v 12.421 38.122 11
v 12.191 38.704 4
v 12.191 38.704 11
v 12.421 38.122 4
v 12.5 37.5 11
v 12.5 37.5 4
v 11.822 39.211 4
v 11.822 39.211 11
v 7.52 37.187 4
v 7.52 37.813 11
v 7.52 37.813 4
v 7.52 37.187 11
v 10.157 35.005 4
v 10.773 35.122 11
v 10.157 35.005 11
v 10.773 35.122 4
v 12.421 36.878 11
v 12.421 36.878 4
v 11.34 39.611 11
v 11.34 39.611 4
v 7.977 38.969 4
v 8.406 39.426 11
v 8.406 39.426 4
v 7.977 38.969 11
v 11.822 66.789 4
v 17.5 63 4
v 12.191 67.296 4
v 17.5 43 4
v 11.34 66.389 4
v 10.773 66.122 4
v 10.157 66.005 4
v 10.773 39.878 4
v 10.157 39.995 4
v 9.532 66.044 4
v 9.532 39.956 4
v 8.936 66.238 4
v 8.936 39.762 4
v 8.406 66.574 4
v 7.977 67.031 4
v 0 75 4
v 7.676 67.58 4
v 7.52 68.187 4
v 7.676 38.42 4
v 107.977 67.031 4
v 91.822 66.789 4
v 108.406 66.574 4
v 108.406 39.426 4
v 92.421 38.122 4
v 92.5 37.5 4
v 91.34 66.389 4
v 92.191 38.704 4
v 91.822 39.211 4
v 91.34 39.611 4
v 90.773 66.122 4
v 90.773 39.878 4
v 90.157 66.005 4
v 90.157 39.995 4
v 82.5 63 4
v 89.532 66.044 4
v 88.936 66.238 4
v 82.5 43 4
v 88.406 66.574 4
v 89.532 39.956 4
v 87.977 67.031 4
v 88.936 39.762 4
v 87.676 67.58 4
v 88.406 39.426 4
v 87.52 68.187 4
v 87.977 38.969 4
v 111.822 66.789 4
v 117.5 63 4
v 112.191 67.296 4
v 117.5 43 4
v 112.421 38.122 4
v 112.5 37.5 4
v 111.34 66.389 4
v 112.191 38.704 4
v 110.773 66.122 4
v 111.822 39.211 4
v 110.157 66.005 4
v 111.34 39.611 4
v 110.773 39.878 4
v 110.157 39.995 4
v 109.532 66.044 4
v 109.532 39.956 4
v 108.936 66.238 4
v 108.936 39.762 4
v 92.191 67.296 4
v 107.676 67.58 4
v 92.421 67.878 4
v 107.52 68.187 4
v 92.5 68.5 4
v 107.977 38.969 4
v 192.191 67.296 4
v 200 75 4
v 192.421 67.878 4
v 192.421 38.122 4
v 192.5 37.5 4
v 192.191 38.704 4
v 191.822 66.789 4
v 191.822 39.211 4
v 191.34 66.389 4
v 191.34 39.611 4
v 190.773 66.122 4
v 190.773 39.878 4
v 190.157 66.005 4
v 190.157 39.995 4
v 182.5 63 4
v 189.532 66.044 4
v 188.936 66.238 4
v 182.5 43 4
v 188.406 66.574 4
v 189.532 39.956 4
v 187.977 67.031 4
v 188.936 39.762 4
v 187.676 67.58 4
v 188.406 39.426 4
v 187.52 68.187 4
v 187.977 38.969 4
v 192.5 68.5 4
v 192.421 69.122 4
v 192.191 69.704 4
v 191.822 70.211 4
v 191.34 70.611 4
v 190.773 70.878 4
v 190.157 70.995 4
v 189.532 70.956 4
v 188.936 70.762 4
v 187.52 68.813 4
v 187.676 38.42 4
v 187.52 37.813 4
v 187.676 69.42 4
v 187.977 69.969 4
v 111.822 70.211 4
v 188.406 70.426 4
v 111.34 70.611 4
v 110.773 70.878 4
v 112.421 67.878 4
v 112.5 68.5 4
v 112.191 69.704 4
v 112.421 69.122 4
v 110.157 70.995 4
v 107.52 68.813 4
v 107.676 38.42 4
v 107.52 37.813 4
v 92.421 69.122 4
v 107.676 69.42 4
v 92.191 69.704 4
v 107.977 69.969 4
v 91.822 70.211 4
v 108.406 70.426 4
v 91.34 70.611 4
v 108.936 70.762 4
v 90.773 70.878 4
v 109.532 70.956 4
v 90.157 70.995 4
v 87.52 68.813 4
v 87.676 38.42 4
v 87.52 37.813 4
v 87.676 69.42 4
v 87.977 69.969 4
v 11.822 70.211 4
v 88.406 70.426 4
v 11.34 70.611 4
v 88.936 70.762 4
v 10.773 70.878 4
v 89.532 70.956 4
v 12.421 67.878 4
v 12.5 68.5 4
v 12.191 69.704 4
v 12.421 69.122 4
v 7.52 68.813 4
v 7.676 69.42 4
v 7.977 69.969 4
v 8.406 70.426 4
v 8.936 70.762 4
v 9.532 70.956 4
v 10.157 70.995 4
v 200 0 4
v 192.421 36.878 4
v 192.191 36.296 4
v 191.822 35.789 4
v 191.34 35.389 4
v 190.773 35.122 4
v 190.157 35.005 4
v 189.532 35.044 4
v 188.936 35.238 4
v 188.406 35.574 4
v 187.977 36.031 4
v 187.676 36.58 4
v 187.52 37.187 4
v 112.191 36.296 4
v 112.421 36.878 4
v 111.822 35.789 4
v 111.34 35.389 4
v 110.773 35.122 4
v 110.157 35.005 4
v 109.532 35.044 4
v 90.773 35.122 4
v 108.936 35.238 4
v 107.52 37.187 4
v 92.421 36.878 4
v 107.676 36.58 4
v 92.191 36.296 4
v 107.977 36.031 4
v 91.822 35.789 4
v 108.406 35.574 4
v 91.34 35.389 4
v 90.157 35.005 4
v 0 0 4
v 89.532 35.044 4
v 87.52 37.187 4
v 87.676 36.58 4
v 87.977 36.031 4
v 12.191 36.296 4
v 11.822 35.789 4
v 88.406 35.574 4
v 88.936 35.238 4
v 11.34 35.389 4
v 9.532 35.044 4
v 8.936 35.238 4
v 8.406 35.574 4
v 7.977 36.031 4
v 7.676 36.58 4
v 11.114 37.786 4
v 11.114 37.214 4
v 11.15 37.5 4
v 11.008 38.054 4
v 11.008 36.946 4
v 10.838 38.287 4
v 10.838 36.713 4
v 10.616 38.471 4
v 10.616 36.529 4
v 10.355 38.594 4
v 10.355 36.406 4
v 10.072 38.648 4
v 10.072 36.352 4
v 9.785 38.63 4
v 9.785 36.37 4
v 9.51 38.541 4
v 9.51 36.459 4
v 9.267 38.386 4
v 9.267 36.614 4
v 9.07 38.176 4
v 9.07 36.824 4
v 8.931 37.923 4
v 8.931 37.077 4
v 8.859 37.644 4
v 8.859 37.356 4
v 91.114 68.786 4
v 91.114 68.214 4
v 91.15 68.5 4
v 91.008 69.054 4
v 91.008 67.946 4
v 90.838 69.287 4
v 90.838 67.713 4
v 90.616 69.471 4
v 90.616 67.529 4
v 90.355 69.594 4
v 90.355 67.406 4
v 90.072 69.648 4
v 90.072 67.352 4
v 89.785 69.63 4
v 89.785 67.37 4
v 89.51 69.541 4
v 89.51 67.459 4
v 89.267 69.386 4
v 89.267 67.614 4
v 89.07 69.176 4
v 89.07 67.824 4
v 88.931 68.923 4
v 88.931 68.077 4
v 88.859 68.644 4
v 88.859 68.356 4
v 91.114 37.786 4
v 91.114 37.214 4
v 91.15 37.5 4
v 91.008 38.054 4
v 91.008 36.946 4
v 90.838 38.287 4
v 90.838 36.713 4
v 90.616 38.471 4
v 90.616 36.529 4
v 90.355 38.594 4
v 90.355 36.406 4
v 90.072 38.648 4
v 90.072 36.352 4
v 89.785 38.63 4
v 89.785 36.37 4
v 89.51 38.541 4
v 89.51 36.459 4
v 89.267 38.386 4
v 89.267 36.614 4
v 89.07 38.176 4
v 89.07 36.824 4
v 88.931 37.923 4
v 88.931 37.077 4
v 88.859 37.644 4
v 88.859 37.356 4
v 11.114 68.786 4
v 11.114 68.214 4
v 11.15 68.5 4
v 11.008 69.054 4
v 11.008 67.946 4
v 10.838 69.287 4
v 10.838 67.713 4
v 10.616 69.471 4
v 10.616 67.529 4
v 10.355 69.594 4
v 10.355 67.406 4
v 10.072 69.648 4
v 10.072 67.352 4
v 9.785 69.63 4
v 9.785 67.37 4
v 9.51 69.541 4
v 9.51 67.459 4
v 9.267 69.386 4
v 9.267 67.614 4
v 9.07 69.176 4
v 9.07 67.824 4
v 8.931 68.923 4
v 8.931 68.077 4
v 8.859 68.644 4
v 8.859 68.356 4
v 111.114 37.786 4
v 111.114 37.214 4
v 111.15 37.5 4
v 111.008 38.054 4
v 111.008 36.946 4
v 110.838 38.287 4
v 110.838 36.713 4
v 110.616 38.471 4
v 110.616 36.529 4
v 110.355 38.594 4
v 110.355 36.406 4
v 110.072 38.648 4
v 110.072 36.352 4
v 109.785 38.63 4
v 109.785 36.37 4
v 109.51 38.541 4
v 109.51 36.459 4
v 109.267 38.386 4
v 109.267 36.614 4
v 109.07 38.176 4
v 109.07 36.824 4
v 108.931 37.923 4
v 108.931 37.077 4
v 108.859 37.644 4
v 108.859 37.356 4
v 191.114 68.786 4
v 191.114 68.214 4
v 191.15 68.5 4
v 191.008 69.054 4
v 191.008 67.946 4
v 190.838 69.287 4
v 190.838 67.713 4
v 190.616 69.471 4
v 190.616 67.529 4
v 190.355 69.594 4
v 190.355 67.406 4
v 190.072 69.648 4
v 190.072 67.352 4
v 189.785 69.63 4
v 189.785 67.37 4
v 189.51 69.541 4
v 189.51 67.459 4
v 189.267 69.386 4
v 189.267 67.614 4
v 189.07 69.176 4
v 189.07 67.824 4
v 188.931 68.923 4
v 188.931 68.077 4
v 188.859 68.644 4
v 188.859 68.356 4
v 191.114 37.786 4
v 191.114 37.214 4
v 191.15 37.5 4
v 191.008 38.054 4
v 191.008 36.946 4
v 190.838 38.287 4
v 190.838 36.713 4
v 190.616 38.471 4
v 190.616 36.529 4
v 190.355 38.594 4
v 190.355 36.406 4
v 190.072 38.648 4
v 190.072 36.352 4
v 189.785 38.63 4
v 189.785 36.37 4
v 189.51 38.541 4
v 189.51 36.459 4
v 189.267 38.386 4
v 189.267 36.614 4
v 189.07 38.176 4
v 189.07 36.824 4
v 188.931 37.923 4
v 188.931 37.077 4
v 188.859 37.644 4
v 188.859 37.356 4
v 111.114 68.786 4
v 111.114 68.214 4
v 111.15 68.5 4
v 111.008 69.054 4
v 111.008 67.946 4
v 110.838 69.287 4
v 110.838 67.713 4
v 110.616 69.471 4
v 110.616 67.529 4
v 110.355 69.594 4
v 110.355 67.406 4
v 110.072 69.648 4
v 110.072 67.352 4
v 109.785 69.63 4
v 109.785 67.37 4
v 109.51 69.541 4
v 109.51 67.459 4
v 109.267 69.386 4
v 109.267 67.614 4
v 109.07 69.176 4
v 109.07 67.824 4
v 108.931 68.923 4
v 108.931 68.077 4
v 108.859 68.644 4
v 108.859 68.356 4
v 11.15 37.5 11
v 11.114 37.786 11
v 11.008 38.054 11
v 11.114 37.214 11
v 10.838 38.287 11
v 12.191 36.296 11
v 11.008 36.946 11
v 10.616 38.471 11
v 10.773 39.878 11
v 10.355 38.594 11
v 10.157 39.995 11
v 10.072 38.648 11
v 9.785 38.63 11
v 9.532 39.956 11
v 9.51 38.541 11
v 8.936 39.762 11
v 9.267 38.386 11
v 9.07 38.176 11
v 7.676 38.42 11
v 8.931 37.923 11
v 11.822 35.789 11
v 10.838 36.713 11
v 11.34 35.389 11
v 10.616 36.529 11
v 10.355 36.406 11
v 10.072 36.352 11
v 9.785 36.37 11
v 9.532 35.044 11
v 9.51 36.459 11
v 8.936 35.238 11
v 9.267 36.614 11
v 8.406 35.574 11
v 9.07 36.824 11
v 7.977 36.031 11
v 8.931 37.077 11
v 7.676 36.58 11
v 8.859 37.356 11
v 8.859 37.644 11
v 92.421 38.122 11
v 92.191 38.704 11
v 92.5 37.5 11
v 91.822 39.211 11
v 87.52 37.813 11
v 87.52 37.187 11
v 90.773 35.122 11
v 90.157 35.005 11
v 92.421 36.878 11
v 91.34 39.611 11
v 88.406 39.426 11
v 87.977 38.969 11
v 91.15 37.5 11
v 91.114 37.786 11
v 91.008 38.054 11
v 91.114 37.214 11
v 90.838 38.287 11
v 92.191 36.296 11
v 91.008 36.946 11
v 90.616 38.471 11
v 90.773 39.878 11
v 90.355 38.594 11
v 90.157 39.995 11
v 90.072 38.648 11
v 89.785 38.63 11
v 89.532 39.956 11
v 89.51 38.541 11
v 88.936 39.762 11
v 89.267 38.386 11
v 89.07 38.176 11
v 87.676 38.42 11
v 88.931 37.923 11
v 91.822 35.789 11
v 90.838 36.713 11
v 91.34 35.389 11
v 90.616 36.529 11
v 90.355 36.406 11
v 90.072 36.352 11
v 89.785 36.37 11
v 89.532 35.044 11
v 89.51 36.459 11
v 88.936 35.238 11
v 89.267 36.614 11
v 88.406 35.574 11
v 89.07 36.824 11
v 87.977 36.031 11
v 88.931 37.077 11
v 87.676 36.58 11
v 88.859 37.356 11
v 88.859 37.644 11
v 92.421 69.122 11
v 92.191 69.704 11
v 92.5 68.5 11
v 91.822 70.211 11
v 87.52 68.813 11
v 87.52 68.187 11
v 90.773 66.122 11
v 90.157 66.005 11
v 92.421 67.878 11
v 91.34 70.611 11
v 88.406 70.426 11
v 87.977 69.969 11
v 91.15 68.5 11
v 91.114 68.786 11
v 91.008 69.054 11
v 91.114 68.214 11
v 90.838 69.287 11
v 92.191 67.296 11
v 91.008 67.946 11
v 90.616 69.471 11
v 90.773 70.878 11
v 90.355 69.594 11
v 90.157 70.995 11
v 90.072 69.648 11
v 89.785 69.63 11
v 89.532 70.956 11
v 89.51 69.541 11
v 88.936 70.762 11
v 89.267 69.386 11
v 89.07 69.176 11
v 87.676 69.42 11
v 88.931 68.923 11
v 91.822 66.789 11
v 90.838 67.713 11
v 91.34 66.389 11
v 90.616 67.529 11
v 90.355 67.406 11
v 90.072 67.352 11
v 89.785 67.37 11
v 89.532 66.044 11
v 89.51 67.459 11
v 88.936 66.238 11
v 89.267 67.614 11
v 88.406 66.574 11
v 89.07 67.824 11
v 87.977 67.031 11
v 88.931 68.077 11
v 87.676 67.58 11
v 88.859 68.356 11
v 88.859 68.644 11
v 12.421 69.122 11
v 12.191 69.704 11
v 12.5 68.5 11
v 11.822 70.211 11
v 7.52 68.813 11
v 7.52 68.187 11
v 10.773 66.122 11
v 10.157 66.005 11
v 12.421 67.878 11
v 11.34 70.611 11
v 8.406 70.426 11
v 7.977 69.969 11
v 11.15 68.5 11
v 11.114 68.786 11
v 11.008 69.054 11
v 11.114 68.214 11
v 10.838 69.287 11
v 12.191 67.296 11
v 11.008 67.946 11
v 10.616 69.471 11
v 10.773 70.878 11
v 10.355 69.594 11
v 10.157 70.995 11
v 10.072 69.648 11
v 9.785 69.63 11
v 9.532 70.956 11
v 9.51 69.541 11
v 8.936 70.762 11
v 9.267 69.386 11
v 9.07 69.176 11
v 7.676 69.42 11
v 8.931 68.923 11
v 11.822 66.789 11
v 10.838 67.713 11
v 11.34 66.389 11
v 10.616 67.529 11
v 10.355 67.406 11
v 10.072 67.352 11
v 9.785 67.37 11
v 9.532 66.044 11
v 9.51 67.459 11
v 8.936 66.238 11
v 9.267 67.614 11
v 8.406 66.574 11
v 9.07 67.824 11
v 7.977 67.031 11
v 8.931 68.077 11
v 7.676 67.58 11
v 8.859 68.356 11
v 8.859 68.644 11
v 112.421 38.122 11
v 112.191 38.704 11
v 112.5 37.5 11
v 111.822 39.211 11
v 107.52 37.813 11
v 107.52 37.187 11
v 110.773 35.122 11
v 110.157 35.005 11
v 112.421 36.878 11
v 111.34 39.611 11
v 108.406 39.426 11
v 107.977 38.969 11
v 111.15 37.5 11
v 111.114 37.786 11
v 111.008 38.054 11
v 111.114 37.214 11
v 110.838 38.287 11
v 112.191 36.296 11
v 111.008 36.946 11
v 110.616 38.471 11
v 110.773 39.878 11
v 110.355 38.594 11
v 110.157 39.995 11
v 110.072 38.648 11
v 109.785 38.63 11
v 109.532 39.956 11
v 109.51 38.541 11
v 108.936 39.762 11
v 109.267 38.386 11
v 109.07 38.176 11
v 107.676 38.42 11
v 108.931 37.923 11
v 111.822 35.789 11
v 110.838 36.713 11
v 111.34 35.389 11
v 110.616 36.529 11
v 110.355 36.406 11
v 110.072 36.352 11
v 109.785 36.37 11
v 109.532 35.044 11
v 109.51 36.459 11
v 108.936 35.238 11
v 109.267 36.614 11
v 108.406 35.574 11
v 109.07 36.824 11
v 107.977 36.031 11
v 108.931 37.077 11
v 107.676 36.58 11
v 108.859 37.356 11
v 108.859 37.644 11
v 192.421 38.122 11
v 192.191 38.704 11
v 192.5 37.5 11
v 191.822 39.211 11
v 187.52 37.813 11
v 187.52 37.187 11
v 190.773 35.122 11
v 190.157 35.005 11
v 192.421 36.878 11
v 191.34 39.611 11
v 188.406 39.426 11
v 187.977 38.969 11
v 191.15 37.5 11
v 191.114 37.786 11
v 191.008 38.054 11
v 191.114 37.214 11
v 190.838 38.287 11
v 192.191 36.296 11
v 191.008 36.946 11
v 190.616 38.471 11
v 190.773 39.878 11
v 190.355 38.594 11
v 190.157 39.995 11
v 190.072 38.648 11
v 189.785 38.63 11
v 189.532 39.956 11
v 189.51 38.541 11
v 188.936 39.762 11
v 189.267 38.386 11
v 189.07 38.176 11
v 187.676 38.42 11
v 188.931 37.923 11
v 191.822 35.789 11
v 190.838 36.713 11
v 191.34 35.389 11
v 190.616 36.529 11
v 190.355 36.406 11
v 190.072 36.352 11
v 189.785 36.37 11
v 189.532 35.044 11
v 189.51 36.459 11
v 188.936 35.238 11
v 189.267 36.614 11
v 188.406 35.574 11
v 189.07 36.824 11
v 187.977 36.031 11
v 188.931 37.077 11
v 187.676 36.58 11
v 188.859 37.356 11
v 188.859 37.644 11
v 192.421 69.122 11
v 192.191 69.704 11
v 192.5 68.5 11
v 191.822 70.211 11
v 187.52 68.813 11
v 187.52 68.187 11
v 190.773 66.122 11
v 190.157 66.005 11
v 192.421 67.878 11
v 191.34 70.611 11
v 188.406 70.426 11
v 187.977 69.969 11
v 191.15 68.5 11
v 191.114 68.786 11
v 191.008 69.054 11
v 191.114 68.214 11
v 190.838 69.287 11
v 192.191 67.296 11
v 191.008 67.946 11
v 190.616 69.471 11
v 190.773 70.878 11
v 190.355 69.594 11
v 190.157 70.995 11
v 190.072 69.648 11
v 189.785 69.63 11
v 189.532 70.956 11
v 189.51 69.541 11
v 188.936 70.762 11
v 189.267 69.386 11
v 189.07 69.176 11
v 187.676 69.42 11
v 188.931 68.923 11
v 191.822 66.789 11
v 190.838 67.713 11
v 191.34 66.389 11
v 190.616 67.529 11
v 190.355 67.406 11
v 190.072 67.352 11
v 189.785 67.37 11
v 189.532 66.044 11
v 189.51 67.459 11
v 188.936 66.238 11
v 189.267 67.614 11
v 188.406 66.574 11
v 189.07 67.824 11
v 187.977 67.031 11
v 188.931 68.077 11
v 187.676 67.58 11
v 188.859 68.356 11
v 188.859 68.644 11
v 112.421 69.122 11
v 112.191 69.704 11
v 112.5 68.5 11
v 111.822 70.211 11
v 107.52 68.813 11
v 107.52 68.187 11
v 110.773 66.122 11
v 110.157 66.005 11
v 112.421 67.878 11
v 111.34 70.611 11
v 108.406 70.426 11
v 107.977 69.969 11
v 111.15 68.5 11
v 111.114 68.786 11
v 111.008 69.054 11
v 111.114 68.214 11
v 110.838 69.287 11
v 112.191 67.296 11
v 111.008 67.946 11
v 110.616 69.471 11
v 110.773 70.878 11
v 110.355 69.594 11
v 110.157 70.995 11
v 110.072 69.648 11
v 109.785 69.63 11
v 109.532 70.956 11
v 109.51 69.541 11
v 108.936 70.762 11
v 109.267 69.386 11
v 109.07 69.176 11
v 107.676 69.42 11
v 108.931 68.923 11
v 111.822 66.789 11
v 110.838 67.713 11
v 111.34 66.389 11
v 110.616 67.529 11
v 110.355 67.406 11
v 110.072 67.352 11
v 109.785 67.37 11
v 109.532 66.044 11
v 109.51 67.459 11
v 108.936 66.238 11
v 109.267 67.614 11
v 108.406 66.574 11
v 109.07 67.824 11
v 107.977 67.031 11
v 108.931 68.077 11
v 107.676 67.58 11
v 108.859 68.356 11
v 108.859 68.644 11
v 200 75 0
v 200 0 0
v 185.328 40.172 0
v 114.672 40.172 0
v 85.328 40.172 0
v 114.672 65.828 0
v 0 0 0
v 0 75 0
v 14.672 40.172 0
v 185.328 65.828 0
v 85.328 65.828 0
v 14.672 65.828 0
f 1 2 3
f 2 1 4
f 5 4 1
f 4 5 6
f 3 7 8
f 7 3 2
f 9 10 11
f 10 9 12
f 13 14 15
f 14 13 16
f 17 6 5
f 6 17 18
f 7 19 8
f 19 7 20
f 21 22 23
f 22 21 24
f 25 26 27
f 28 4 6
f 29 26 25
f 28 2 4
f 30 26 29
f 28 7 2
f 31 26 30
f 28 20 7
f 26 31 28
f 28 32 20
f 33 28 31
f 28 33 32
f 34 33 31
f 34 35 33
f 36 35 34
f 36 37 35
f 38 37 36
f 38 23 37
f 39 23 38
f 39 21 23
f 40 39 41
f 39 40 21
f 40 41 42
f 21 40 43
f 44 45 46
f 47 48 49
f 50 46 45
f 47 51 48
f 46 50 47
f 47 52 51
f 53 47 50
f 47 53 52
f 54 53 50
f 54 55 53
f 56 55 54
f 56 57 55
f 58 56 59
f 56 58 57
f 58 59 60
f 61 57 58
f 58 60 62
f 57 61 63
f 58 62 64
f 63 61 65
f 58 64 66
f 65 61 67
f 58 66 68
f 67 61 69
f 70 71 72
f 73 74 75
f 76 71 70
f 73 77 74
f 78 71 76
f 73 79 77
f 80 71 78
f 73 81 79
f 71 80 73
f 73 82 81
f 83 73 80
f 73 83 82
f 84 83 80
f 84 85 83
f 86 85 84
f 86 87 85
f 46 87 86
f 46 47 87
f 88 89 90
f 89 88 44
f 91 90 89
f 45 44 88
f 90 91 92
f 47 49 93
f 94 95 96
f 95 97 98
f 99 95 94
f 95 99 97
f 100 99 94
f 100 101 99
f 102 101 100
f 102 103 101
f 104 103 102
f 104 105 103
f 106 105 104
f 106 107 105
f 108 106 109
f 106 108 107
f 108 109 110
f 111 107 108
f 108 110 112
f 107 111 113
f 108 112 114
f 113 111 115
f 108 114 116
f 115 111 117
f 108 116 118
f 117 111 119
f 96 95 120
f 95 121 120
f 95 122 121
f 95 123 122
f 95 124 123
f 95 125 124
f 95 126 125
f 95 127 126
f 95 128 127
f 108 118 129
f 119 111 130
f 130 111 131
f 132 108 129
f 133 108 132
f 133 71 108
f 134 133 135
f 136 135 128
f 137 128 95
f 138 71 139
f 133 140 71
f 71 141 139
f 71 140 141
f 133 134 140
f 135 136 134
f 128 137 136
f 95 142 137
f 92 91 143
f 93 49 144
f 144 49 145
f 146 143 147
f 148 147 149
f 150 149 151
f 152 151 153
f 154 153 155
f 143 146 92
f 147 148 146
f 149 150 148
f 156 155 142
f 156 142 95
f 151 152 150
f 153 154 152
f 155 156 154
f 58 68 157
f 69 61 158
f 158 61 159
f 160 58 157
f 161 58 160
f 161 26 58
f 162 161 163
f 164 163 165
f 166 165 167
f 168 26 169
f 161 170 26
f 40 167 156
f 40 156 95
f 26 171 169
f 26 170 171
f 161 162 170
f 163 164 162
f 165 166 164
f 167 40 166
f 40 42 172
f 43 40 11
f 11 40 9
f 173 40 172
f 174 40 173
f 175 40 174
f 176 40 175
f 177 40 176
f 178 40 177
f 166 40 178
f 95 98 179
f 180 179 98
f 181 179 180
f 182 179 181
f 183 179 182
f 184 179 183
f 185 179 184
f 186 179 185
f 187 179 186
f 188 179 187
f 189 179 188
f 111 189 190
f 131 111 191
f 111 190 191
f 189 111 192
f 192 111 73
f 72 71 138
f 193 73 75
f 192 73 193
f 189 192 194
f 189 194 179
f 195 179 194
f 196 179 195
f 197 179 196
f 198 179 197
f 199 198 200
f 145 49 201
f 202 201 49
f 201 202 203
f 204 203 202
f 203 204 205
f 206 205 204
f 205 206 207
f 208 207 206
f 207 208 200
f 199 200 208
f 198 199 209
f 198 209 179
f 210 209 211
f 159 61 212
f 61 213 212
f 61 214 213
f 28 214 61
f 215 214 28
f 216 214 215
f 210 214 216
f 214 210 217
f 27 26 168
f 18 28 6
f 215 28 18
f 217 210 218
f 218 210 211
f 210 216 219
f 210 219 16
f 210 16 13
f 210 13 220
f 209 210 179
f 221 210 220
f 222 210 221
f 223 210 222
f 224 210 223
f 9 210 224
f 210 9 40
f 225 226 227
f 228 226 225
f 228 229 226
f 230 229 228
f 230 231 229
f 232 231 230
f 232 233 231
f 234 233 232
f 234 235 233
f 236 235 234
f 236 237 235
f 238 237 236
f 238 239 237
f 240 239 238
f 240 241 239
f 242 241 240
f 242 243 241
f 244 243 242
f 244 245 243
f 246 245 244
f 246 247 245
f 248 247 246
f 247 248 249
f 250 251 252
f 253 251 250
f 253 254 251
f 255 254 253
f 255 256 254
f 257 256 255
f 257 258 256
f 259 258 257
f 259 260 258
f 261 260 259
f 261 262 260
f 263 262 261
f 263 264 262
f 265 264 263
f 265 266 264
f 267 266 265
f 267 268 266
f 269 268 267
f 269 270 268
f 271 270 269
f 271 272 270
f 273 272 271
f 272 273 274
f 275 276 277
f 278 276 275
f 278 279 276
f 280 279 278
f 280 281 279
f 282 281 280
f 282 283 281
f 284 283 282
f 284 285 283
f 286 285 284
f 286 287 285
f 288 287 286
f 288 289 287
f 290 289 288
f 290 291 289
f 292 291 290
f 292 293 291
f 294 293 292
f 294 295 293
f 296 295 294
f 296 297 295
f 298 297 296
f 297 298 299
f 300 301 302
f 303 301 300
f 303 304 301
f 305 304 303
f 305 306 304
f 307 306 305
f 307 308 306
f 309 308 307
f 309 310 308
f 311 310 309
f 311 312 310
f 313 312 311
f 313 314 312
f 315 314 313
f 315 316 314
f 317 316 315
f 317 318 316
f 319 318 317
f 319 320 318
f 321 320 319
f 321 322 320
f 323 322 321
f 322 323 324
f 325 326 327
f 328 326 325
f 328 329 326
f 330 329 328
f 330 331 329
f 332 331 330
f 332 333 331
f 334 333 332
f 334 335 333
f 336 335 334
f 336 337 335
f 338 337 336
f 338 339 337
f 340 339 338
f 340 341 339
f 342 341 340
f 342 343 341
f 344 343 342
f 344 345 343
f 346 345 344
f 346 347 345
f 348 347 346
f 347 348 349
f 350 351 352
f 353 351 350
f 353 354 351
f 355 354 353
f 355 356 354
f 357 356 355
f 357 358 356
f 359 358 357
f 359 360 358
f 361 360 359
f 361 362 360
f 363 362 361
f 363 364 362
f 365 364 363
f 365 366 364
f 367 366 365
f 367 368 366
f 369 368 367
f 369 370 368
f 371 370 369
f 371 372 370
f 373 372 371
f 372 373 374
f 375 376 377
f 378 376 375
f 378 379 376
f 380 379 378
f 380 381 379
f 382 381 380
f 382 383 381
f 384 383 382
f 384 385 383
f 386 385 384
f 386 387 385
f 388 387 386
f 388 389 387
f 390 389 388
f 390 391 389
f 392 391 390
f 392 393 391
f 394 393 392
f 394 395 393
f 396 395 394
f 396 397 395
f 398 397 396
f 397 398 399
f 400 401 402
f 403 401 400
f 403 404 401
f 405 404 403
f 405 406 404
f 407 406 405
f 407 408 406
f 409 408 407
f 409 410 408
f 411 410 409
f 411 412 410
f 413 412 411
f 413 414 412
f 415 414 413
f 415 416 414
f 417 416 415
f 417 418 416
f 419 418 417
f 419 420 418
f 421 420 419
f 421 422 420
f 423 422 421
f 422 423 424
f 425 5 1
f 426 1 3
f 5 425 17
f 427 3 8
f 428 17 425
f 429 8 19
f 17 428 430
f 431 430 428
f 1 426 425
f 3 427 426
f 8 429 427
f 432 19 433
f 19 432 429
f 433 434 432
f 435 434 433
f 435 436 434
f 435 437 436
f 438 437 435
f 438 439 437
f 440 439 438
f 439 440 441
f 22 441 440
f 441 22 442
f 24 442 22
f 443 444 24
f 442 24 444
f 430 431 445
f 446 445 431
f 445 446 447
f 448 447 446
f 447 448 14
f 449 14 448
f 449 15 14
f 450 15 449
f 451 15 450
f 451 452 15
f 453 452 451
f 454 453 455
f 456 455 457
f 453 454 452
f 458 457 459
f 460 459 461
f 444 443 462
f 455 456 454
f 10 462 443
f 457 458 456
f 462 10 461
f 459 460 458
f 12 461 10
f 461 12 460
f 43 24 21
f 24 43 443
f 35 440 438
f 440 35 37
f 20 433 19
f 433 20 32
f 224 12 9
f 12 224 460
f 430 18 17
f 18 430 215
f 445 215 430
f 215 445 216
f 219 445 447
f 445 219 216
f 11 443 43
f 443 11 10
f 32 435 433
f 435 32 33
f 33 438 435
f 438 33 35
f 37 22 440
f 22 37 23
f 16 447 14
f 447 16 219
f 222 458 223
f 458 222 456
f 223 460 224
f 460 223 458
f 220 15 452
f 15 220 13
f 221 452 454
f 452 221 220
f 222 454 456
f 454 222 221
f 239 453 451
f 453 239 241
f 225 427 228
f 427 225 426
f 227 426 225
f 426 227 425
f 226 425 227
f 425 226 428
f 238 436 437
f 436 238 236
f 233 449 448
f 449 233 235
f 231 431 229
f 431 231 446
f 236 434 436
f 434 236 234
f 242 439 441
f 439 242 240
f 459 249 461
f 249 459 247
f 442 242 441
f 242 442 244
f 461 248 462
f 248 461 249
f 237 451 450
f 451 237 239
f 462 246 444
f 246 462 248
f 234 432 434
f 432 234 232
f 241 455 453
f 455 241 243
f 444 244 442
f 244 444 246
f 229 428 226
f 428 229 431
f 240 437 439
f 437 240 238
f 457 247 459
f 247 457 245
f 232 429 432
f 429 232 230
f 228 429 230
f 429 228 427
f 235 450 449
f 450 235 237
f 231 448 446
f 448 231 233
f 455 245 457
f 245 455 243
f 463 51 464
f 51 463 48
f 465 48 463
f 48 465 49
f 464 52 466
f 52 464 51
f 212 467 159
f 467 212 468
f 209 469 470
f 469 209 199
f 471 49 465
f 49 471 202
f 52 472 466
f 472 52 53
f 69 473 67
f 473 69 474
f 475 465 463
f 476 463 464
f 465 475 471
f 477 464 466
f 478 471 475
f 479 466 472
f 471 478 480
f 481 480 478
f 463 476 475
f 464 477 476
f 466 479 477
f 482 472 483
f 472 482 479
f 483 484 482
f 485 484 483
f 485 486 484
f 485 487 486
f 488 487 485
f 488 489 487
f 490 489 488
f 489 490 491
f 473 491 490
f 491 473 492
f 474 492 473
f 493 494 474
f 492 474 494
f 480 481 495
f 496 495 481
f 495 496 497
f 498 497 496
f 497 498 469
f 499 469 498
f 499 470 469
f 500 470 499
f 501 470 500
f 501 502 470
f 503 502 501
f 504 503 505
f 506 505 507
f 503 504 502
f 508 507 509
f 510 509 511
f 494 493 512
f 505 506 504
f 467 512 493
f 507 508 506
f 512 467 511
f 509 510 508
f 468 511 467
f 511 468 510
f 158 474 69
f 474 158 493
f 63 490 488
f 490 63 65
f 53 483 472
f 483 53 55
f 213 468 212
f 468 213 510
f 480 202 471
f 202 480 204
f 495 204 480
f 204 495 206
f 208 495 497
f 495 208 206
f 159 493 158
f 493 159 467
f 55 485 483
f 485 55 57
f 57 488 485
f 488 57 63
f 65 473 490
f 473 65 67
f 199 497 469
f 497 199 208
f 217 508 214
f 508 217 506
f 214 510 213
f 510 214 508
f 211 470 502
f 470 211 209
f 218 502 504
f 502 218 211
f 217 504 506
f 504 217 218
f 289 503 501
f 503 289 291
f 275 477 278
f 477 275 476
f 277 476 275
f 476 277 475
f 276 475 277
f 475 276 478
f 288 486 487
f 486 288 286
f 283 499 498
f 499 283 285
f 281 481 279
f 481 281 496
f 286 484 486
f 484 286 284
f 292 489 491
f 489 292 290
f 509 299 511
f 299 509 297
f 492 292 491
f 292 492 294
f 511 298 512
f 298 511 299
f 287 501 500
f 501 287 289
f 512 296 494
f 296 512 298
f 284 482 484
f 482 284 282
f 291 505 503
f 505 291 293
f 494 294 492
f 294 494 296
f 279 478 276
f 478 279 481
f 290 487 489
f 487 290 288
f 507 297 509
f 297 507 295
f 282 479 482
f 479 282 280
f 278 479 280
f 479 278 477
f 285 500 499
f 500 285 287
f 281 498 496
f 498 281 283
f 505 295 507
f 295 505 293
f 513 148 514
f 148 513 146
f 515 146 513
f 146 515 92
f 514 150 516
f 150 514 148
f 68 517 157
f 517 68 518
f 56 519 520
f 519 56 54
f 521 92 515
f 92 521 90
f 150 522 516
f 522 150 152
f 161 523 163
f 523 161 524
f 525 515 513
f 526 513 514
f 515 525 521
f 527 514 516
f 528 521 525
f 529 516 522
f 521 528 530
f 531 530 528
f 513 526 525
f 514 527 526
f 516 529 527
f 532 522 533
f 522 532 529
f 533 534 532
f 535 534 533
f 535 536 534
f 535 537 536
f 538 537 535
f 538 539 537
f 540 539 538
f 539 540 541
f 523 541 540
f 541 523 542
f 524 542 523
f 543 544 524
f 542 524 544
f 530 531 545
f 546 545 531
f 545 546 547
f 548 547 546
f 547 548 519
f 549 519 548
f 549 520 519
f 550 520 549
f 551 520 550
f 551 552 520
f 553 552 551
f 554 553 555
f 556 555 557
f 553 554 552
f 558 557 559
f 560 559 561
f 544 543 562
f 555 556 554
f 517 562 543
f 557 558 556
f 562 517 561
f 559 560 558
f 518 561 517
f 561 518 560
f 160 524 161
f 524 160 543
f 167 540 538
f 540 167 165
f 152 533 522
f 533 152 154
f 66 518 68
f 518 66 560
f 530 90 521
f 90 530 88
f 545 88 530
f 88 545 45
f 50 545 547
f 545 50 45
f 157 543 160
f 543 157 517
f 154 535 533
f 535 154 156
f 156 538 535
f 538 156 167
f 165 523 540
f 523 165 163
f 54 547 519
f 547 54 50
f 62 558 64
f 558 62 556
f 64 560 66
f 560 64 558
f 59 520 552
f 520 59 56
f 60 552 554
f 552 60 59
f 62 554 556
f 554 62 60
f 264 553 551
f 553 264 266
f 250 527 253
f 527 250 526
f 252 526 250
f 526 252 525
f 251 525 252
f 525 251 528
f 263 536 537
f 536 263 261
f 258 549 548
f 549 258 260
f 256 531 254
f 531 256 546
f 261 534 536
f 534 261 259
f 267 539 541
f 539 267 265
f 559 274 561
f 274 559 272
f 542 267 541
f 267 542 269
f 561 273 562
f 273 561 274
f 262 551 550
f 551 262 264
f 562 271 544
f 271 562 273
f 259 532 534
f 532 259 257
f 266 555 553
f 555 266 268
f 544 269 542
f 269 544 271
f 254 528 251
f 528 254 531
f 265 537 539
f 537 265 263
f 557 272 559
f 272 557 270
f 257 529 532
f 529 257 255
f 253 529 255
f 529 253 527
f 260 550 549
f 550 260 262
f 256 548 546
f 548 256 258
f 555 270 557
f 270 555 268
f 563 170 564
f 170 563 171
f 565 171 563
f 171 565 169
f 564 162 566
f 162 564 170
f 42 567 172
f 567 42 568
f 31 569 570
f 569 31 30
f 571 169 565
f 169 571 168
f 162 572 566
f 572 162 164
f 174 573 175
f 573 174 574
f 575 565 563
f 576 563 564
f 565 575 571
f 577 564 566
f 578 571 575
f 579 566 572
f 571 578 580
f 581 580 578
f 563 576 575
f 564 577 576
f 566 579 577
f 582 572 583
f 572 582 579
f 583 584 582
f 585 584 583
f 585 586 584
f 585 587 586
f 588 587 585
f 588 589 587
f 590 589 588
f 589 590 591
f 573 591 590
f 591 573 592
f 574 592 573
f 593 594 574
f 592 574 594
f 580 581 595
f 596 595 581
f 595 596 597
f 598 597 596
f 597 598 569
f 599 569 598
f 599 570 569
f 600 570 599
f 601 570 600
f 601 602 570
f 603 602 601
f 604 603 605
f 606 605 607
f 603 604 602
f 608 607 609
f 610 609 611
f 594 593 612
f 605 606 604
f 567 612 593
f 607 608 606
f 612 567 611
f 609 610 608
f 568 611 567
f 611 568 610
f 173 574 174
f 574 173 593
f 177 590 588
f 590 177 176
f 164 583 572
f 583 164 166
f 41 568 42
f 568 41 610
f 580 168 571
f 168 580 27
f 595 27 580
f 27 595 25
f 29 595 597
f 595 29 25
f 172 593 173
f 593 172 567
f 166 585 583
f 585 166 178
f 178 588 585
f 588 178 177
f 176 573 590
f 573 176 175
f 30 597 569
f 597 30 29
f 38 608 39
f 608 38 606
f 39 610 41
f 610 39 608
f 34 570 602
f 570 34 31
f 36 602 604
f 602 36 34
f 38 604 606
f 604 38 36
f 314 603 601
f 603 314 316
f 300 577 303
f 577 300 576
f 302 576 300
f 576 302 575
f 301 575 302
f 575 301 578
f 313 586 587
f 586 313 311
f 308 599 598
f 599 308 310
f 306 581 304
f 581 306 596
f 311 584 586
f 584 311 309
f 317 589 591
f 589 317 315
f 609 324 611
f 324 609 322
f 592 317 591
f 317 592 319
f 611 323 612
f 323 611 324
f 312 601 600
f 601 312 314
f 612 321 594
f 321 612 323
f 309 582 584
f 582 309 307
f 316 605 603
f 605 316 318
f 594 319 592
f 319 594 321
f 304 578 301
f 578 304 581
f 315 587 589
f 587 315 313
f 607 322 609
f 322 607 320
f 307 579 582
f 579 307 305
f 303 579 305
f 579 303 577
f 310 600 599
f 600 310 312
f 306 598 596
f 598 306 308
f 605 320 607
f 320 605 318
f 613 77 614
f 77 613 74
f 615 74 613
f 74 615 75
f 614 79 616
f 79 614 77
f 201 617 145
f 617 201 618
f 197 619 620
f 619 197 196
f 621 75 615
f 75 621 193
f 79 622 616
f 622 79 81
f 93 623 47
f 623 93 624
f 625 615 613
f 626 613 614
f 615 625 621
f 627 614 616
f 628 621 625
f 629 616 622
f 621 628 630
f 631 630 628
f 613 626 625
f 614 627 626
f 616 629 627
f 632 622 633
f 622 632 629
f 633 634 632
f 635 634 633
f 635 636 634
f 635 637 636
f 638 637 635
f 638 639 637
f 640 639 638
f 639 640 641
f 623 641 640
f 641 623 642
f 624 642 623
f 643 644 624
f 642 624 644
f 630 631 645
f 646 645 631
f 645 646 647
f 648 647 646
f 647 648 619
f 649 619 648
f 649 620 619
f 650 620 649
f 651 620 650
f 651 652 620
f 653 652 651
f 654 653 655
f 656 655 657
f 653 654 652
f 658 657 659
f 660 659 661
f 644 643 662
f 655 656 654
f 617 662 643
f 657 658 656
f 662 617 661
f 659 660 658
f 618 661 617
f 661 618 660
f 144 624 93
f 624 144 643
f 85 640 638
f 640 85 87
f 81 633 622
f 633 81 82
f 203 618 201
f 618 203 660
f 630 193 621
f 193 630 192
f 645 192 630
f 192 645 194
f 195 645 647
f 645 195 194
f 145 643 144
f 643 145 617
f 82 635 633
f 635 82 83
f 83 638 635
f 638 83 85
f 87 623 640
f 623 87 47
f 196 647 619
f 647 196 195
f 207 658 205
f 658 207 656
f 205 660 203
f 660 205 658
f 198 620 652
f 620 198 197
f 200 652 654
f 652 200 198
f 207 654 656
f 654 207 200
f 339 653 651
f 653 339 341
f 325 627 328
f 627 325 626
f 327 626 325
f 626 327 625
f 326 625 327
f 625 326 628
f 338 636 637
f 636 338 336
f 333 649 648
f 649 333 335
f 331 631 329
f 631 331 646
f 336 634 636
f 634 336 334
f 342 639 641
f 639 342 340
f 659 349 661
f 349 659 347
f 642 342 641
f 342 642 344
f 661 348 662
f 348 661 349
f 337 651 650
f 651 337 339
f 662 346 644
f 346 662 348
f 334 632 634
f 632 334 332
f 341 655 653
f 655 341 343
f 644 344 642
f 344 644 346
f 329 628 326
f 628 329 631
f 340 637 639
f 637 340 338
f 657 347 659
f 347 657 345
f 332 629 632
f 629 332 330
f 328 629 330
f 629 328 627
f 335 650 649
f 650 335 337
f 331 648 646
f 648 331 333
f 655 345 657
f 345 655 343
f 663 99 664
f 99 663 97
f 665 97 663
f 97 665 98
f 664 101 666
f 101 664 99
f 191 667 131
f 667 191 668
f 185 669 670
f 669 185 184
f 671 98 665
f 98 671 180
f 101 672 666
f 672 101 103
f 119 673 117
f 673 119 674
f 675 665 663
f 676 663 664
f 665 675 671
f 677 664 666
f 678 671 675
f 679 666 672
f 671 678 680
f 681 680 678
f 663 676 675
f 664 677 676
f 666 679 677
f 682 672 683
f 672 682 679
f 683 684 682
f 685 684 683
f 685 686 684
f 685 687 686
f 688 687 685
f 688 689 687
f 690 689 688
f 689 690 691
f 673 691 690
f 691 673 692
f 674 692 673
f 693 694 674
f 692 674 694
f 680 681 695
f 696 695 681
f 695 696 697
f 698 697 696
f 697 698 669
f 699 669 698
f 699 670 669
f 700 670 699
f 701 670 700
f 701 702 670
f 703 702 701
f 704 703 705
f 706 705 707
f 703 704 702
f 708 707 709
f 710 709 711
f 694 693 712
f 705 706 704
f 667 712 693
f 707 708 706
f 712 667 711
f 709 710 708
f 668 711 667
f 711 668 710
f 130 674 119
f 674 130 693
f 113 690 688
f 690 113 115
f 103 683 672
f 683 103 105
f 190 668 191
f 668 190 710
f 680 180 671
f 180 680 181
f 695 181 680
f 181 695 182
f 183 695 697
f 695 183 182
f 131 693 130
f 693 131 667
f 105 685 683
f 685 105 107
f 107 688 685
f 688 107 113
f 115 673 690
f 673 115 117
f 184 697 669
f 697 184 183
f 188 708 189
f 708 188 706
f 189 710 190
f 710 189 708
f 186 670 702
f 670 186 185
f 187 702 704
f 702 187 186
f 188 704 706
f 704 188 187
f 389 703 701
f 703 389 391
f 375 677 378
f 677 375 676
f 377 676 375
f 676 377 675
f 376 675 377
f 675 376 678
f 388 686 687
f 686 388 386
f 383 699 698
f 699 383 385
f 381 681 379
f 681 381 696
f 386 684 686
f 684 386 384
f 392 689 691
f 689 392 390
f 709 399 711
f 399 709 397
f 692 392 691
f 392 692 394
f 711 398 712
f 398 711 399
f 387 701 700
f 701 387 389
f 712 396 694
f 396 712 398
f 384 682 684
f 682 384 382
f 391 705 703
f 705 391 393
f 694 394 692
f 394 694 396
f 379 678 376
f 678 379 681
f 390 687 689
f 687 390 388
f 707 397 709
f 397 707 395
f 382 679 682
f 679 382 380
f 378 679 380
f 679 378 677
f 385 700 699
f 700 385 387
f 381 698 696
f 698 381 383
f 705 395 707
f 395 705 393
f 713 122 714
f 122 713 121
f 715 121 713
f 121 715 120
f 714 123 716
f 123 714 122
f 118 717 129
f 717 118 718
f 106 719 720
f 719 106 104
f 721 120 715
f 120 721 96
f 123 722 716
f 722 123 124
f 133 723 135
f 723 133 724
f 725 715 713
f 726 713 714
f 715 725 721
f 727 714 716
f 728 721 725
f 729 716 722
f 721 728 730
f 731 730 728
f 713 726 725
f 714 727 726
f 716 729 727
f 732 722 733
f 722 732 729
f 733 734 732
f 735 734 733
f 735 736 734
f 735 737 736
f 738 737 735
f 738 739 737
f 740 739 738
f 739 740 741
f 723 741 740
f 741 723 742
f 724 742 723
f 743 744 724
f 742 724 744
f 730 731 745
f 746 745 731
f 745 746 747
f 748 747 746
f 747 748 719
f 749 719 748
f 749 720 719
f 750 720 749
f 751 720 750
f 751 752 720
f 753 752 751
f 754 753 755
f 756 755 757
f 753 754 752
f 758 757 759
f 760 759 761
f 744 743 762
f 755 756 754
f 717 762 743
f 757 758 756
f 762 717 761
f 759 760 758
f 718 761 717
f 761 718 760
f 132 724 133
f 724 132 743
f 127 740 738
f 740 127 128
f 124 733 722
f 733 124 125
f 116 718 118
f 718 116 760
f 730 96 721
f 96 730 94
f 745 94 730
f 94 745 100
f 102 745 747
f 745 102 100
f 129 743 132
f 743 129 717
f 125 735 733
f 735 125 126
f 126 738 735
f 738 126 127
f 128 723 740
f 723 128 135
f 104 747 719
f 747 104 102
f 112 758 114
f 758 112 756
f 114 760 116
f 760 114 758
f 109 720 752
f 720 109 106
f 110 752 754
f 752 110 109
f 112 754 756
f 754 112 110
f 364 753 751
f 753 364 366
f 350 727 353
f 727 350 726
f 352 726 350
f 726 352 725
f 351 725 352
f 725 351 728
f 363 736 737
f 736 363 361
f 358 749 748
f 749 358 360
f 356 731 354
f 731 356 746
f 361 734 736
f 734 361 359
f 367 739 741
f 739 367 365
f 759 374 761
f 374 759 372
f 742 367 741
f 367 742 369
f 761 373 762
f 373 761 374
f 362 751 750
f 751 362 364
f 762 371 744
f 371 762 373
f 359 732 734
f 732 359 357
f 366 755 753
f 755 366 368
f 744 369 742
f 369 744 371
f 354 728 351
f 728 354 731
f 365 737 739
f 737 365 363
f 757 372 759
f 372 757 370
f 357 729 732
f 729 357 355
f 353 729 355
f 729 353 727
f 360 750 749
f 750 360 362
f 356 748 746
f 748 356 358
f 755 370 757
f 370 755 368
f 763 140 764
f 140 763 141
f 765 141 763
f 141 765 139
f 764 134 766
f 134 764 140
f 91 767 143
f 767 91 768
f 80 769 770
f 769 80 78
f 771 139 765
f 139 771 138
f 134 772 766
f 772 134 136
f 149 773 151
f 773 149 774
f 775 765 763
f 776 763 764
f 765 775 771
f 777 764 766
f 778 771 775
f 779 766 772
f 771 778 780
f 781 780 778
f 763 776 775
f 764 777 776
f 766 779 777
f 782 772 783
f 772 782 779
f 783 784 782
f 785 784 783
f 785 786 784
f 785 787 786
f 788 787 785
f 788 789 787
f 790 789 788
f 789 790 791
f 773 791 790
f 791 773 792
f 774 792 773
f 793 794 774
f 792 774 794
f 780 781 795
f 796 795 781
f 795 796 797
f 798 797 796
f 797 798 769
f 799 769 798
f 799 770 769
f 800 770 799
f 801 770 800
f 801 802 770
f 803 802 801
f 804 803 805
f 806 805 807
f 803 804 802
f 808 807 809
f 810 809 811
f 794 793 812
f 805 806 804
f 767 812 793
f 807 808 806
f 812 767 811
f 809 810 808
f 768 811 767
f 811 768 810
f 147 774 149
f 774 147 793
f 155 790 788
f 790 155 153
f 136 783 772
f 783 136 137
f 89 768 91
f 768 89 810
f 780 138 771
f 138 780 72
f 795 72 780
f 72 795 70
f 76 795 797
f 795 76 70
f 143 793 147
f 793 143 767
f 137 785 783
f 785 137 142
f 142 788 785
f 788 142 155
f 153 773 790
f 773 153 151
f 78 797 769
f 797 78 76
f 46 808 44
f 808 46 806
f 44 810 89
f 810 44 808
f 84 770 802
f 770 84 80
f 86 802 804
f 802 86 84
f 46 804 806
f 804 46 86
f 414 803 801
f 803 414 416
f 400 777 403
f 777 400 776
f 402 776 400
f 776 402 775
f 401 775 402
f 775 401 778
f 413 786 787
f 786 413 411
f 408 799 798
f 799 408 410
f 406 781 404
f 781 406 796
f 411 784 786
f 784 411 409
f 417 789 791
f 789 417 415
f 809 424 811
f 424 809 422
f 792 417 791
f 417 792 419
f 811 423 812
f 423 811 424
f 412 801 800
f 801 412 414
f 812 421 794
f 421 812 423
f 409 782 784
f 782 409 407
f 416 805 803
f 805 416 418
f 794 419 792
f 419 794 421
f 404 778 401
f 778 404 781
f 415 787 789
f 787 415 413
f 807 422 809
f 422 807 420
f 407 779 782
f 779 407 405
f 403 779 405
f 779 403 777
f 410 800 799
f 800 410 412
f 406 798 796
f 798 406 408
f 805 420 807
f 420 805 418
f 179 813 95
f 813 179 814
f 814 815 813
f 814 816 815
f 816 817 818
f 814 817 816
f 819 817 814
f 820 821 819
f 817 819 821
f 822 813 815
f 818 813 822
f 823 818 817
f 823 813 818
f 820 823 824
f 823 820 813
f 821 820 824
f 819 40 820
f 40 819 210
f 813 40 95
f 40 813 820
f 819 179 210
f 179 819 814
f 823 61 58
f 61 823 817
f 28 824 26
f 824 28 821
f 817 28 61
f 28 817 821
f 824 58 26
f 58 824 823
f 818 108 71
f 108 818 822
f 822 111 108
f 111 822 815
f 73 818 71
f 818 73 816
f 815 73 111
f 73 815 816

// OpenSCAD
// file: lib/shapes.scad
module flat_pyramid(x, y, z, angle=45) {  
    p = z * sin(angle);
    hull() {
        cube([x, y, z]);
        translate([-p, -p, -z])
            cube([x+(2*p), y+(2*p), z]);
    }   
}

module screw_mount(h=0, d=5, ds=2.3) {
    difference() {
        cylinder(h=h, r=d/2);
        cylinder(h=h, r=ds/2);       
    }
}
// file: lib/lcd.scad
use <shapes.scad>

module __lcd_cutout(x, y, width, height, thickness) {
    translate([x, y])
        flat_pyramid(width,height,thickness);
}

module __lcd_mount(width, height, spacer) {
    screw_mount(h=spacer);
    translate([width, 0]) screw_mount(h=spacer);
    translate([width, height]) screw_mount(h=spacer);
    translate([0, height]) screw_mount(h=spacer);
}

//----------------------------------------------------------------------
//  16x2 LCD
//----------------------------------------------------------------------

lcd_1602_hole_width = 80;
lcd_1602_hole_height = 31;
lcd_1602_spacer = 7;
lcd_1602_view_width = 65;
lcd_1602_view_height = 20;
lcd_1602_view_x = 7.5;
lcd_1602_view_y = 5.5;

module lcd_1602_mount() {
    __lcd_mount(lcd_1602_hole_width, lcd_1602_hole_height, lcd_1602_spacer);
}

module lcd_1602_cutout(thickness) {
    __lcd_cutout(
        lcd_1602_view_x, lcd_1602_view_y,
        lcd_1602_view_width,lcd_1602_view_height,
        thickness
    );
}
// file: lib/pushbutton.scad
module pushbutton_cutout(d0=5, d1=8, h0=2, h1=4) {
    cylinder(h=h0, r=(d0/2));

    translate([0,0,h0])
        cylinder(h=h1, r=(d1/2));
}
// file: lib/oled.scad
use <shapes.scad>

module oled_cradle() {

}

module oled_cutout(thickness) {
    flat_pyramid(40,20,thickness);
}
// file: lib/rotaryencoder.scad
module rotaryencoder_boxed(positive, tfront=2) {

    // Diameter of rotary stem
    stem_d = 7.0;

    // Length of stem (which should be inside model)
    stem_z = 4;

    box_t = 1;
    box_h = box_t;

    // Tiny box that surrounds the rotary encoder
    box_inner = [12.2, 12.2, box_h];

    // The whole block the rotary encoder sits in
    box_outer = [
        box_inner.x+(2*box_t),
        box_inner.y+(2*box_t),
        box_inner.z + stem_z,
    ];

    box_inner_pos = [
        -box_inner.x/2,
        -box_inner.y/2,
        box_outer.z - box_inner.z
    ];

    box_outer_pos = [
        -box_outer.x/2,
        -box_outer.y/2,
        0,
    ];

    // Part of the front we'll remove and replace
    front = [box_outer.x, box_outer.y, tfront];

    module __build() {
            translate([0,0,-tfront])
            difference() {
                union() {
                    translate(box_outer_pos)
                    cube(box_outer);
                }
                union() {
                    cylinder(r=stem_d/2, h=stem_z);
                    translate(box_inner_pos) cube(box_inner);
                }
            }
    }

    if (positive) {
        __build();
    } else {
        difference() {
            translate([0,0,-tfront])
            translate(box_outer_pos)
            cube(box_outer);
            __build();
        }
    }
}
// main file
// MT32-Pi controls for 3.5" bay
// By Hans Christian Saustrup <hc@saustrup.net>
model_version = "v0.0.1";

use <lib/rotaryencoder.scad>
use <lib/oled.scad>
use <lib/pushbutton.scad>
use <lib/lcd.scad>

$fn = $preview ? 0 : 25; 

front_width = 200;
front_height = 75;
front_thickness = 4;

oled_x = 10;
oled_y = front_height/2;

difference() {
    union() {
        // Front
        cube([front_width, front_height, front_thickness]);

        // Attach to front:
        translate([0,0,front_thickness]) {
            translate([oled_x, oled_y])
                lcd_1602_mount();
            translate([oled_x+100, oled_y])
                lcd_1602_mount();
        }
    }
    union() {
        // Cut out of front:
        translate([oled_x, oled_y])
            lcd_1602_cutout(front_thickness);
        translate([oled_x+100, oled_y])
            lcd_1602_cutout(front_thickness);

    }
}

// oled_cutout();
// pushbutton_cutout();


// // Hole size for screws
// screw_insert_diameter = 2.8;

// // Enable this for a cropped version of the front only
// front_preview_only = false;

// front_width = front_preview_only ? 102 : 102;
// front_height = 25;
// front_thickness = 3;

// tray_rim_depth = 5;
// tray_rim_thickness = 2;

// tray_width = front_width;
// tray_depth = 53;
// tray_height = front_height;
// tray_thickness = 2;
// tray_bottom_bracket_width = tray_rim_depth * 3;

// side_height = front_height;
// side_thickness = 2;
// side_screws_distance_front = 52; // 47;
// side_screws_distance_bottom1 = 10;
// side_screws_distance_bottom2 = 22;

// // PCB module width
// m = 2.54;


// // PCB spacer height
// pcb_space = 6;

// pcb_horizontal_screw_distance = 23 * m;
// pcb_vertical_screw_distance = 9 * m;
// pcb_horizontal_offset = 0.5 * m;
// pcb_vertical_offset = 0.5 * m;

// display_padding = 3;
// display_width = display_padding + 22.384;
// display_height = display_padding + 5.584;
// display_hull = front_thickness;

// button_diameter = 6;
// button_rim_diameter = 8;
// button_rim_height = 2;

// rotary_diameter = 7.1;
// rotary_screw_diameter = 12;
// rotary_height = 2.0;
// rotary_tip_diameter = 2.5;
// rotary_tip_distance = 6.0;
// rotary_tip_depth = 1.45;

// rotary_ridge_depth = 0.5;
// rotary_ridge_diameter = 10;

// module screwmount(h) {
//     d = screw_insert_diameter;

//     difference() {
//         hull() {
//             cylinder(h=0.1, r=(d/2)*3.0);
//             cylinder(h=h, r=(d/2)*2.0);
//         }
//         cylinder(h=h, r=(d/2)*1);
//     }
// }

// module buttonhole() {
//     cylinder(h=front_thickness, r=(button_diameter/2));

//     translate([0,0,(front_thickness)-button_rim_height])
//     cylinder(h=front_thickness, r=(button_rim_diameter/2));
// }

// module lcdhole() {  
//     hull() {
//         cube([display_width, display_height,front_thickness]);
//         translate([-(display_hull), -(display_hull), -front_thickness]) cube([display_width+display_hull*2, display_height+display_hull*2,0.1]);
//     }
// }

// module rotaryhole() {
//     // Primary hole
//     cylinder(h=front_thickness, r=(rotary_diameter/2));

//     // Screw/washer hole
//     cylinder(h=(front_thickness-rotary_height), r=(rotary_screw_diameter/2));

//     // Ridge thing
//     translate([0, 0, front_thickness - rotary_ridge_depth])
//         cylinder(h=rotary_ridge_depth, r=rotary_ridge_diameter/2);

//     // The nudge/tip:
//     translate([-rotary_tip_distance, 0, front_thickness - rotary_tip_depth])
//         cylinder(h=rotary_tip_depth, r=rotary_tip_diameter/2);
// }

// module pcb(w, h, cutout=false) {
//     rotate([90,0,0]) translate([-w/2 + pcb_horizontal_offset, -h/2 + pcb_vertical_offset]) {
//         if (cutout) {
//             pcb_holes(w, h);
//         } else {
//             translate([0,0,front_thickness]) pcb_mounts(w, h);
//         }
//     }
// }

// module pcb_mounts(w, h) {
//     translate([0,0,0]) screwmount(pcb_space);
//     translate([0,h-1,0]) screwmount(pcb_space);
//     translate([w-1,0,0]) screwmount(pcb_space);
//     translate([w-1,h-1,0]) screwmount(pcb_space);
// }

// module pcb_holes(w, h) {
//     // Offset from corner of component to hole
//     display_offset_x = 2.0 * m;
//     display_offset_y = 0.5 * m;
//     button_offset_x = 1.5 * m;
//     button_offset_y = 1 * m;

//     translate([
//         (11 * m) ,
//         (1 * m) 
//     ]) rotaryhole();

//     translate([
//         (4 * m) + display_offset_x,
//         (5 * m) + display_offset_y
//     ]) lcdhole();
//     translate([
//         (4 * m) + button_offset_x,
//         (0 * m) + button_offset_y
//     ]) buttonhole();
//     translate([
//         (15 * m) + button_offset_x,
//         (0 * m) + button_offset_y
//     ]) buttonhole();
// }

// module front() {
//     difference() {
//         union() {
//             translate([0,-front_thickness/2,0]) {
//                 color([1, 0.9, 0.9]) cube([front_width, front_thickness, tray_height], center = true);
//             }
//         }
//         union() {
//             pcb(23*m,9*m,true);
//         }
//     }
//     pcb(23*m,9*m);
// }

// module tray() {
//     // Move behind front
//     translate([0,-front_thickness,0]) {
       
//         // Rim
//         translate([0,-tray_rim_depth/2,0])
//         difference() {
//             cube([tray_width, tray_rim_depth, tray_height], center=true);
//             cube([tray_width - tray_rim_thickness*2, tray_rim_depth, tray_height - tray_rim_thickness*2], center=true);
//         }

//         // Tray
//         translate([0,-tray_depth/2, -(tray_height - side_height)/2])
//         difference() {
//             cube([tray_width, tray_depth, side_height], center=true);
//             union() {
//                 // Inside of tray cube
//                 union() {
//                 translate([0,0,side_thickness/2])
//                     cube([tray_width - side_thickness*2, tray_depth, side_height - side_thickness], center=true);
//                 }
//                 // Bottom cutout
//                 translate([0,-tray_bottom_bracket_width,0- (side_height/2) + side_thickness])
//                     color([1,0,0])
//                     cube([tray_width - (2*tray_bottom_bracket_width) - side_thickness/2, tray_depth - tray_bottom_bracket_width, side_thickness*2], center=true);

//                 // Screw holes
//                 translate([0, (tray_depth/2) - side_screws_distance_front + front_thickness, -side_height/2])
//                 rotate([0,90,0]) {
//                     translate([ -side_screws_distance_bottom1,0,0])
//                         cylinder(r=screw_insert_diameter/2, h=tray_width, center=true);
//                     translate([ -side_screws_distance_bottom2,0,0])
//                         cylinder(r=screw_insert_diameter/2, h=tray_width, center=true);
//                 }
//             }
//         }
//     }
// }

// front();
// if (front_preview_only == false) {
//     tray();
// }

// echo("OpenSCAD Version:", version());
